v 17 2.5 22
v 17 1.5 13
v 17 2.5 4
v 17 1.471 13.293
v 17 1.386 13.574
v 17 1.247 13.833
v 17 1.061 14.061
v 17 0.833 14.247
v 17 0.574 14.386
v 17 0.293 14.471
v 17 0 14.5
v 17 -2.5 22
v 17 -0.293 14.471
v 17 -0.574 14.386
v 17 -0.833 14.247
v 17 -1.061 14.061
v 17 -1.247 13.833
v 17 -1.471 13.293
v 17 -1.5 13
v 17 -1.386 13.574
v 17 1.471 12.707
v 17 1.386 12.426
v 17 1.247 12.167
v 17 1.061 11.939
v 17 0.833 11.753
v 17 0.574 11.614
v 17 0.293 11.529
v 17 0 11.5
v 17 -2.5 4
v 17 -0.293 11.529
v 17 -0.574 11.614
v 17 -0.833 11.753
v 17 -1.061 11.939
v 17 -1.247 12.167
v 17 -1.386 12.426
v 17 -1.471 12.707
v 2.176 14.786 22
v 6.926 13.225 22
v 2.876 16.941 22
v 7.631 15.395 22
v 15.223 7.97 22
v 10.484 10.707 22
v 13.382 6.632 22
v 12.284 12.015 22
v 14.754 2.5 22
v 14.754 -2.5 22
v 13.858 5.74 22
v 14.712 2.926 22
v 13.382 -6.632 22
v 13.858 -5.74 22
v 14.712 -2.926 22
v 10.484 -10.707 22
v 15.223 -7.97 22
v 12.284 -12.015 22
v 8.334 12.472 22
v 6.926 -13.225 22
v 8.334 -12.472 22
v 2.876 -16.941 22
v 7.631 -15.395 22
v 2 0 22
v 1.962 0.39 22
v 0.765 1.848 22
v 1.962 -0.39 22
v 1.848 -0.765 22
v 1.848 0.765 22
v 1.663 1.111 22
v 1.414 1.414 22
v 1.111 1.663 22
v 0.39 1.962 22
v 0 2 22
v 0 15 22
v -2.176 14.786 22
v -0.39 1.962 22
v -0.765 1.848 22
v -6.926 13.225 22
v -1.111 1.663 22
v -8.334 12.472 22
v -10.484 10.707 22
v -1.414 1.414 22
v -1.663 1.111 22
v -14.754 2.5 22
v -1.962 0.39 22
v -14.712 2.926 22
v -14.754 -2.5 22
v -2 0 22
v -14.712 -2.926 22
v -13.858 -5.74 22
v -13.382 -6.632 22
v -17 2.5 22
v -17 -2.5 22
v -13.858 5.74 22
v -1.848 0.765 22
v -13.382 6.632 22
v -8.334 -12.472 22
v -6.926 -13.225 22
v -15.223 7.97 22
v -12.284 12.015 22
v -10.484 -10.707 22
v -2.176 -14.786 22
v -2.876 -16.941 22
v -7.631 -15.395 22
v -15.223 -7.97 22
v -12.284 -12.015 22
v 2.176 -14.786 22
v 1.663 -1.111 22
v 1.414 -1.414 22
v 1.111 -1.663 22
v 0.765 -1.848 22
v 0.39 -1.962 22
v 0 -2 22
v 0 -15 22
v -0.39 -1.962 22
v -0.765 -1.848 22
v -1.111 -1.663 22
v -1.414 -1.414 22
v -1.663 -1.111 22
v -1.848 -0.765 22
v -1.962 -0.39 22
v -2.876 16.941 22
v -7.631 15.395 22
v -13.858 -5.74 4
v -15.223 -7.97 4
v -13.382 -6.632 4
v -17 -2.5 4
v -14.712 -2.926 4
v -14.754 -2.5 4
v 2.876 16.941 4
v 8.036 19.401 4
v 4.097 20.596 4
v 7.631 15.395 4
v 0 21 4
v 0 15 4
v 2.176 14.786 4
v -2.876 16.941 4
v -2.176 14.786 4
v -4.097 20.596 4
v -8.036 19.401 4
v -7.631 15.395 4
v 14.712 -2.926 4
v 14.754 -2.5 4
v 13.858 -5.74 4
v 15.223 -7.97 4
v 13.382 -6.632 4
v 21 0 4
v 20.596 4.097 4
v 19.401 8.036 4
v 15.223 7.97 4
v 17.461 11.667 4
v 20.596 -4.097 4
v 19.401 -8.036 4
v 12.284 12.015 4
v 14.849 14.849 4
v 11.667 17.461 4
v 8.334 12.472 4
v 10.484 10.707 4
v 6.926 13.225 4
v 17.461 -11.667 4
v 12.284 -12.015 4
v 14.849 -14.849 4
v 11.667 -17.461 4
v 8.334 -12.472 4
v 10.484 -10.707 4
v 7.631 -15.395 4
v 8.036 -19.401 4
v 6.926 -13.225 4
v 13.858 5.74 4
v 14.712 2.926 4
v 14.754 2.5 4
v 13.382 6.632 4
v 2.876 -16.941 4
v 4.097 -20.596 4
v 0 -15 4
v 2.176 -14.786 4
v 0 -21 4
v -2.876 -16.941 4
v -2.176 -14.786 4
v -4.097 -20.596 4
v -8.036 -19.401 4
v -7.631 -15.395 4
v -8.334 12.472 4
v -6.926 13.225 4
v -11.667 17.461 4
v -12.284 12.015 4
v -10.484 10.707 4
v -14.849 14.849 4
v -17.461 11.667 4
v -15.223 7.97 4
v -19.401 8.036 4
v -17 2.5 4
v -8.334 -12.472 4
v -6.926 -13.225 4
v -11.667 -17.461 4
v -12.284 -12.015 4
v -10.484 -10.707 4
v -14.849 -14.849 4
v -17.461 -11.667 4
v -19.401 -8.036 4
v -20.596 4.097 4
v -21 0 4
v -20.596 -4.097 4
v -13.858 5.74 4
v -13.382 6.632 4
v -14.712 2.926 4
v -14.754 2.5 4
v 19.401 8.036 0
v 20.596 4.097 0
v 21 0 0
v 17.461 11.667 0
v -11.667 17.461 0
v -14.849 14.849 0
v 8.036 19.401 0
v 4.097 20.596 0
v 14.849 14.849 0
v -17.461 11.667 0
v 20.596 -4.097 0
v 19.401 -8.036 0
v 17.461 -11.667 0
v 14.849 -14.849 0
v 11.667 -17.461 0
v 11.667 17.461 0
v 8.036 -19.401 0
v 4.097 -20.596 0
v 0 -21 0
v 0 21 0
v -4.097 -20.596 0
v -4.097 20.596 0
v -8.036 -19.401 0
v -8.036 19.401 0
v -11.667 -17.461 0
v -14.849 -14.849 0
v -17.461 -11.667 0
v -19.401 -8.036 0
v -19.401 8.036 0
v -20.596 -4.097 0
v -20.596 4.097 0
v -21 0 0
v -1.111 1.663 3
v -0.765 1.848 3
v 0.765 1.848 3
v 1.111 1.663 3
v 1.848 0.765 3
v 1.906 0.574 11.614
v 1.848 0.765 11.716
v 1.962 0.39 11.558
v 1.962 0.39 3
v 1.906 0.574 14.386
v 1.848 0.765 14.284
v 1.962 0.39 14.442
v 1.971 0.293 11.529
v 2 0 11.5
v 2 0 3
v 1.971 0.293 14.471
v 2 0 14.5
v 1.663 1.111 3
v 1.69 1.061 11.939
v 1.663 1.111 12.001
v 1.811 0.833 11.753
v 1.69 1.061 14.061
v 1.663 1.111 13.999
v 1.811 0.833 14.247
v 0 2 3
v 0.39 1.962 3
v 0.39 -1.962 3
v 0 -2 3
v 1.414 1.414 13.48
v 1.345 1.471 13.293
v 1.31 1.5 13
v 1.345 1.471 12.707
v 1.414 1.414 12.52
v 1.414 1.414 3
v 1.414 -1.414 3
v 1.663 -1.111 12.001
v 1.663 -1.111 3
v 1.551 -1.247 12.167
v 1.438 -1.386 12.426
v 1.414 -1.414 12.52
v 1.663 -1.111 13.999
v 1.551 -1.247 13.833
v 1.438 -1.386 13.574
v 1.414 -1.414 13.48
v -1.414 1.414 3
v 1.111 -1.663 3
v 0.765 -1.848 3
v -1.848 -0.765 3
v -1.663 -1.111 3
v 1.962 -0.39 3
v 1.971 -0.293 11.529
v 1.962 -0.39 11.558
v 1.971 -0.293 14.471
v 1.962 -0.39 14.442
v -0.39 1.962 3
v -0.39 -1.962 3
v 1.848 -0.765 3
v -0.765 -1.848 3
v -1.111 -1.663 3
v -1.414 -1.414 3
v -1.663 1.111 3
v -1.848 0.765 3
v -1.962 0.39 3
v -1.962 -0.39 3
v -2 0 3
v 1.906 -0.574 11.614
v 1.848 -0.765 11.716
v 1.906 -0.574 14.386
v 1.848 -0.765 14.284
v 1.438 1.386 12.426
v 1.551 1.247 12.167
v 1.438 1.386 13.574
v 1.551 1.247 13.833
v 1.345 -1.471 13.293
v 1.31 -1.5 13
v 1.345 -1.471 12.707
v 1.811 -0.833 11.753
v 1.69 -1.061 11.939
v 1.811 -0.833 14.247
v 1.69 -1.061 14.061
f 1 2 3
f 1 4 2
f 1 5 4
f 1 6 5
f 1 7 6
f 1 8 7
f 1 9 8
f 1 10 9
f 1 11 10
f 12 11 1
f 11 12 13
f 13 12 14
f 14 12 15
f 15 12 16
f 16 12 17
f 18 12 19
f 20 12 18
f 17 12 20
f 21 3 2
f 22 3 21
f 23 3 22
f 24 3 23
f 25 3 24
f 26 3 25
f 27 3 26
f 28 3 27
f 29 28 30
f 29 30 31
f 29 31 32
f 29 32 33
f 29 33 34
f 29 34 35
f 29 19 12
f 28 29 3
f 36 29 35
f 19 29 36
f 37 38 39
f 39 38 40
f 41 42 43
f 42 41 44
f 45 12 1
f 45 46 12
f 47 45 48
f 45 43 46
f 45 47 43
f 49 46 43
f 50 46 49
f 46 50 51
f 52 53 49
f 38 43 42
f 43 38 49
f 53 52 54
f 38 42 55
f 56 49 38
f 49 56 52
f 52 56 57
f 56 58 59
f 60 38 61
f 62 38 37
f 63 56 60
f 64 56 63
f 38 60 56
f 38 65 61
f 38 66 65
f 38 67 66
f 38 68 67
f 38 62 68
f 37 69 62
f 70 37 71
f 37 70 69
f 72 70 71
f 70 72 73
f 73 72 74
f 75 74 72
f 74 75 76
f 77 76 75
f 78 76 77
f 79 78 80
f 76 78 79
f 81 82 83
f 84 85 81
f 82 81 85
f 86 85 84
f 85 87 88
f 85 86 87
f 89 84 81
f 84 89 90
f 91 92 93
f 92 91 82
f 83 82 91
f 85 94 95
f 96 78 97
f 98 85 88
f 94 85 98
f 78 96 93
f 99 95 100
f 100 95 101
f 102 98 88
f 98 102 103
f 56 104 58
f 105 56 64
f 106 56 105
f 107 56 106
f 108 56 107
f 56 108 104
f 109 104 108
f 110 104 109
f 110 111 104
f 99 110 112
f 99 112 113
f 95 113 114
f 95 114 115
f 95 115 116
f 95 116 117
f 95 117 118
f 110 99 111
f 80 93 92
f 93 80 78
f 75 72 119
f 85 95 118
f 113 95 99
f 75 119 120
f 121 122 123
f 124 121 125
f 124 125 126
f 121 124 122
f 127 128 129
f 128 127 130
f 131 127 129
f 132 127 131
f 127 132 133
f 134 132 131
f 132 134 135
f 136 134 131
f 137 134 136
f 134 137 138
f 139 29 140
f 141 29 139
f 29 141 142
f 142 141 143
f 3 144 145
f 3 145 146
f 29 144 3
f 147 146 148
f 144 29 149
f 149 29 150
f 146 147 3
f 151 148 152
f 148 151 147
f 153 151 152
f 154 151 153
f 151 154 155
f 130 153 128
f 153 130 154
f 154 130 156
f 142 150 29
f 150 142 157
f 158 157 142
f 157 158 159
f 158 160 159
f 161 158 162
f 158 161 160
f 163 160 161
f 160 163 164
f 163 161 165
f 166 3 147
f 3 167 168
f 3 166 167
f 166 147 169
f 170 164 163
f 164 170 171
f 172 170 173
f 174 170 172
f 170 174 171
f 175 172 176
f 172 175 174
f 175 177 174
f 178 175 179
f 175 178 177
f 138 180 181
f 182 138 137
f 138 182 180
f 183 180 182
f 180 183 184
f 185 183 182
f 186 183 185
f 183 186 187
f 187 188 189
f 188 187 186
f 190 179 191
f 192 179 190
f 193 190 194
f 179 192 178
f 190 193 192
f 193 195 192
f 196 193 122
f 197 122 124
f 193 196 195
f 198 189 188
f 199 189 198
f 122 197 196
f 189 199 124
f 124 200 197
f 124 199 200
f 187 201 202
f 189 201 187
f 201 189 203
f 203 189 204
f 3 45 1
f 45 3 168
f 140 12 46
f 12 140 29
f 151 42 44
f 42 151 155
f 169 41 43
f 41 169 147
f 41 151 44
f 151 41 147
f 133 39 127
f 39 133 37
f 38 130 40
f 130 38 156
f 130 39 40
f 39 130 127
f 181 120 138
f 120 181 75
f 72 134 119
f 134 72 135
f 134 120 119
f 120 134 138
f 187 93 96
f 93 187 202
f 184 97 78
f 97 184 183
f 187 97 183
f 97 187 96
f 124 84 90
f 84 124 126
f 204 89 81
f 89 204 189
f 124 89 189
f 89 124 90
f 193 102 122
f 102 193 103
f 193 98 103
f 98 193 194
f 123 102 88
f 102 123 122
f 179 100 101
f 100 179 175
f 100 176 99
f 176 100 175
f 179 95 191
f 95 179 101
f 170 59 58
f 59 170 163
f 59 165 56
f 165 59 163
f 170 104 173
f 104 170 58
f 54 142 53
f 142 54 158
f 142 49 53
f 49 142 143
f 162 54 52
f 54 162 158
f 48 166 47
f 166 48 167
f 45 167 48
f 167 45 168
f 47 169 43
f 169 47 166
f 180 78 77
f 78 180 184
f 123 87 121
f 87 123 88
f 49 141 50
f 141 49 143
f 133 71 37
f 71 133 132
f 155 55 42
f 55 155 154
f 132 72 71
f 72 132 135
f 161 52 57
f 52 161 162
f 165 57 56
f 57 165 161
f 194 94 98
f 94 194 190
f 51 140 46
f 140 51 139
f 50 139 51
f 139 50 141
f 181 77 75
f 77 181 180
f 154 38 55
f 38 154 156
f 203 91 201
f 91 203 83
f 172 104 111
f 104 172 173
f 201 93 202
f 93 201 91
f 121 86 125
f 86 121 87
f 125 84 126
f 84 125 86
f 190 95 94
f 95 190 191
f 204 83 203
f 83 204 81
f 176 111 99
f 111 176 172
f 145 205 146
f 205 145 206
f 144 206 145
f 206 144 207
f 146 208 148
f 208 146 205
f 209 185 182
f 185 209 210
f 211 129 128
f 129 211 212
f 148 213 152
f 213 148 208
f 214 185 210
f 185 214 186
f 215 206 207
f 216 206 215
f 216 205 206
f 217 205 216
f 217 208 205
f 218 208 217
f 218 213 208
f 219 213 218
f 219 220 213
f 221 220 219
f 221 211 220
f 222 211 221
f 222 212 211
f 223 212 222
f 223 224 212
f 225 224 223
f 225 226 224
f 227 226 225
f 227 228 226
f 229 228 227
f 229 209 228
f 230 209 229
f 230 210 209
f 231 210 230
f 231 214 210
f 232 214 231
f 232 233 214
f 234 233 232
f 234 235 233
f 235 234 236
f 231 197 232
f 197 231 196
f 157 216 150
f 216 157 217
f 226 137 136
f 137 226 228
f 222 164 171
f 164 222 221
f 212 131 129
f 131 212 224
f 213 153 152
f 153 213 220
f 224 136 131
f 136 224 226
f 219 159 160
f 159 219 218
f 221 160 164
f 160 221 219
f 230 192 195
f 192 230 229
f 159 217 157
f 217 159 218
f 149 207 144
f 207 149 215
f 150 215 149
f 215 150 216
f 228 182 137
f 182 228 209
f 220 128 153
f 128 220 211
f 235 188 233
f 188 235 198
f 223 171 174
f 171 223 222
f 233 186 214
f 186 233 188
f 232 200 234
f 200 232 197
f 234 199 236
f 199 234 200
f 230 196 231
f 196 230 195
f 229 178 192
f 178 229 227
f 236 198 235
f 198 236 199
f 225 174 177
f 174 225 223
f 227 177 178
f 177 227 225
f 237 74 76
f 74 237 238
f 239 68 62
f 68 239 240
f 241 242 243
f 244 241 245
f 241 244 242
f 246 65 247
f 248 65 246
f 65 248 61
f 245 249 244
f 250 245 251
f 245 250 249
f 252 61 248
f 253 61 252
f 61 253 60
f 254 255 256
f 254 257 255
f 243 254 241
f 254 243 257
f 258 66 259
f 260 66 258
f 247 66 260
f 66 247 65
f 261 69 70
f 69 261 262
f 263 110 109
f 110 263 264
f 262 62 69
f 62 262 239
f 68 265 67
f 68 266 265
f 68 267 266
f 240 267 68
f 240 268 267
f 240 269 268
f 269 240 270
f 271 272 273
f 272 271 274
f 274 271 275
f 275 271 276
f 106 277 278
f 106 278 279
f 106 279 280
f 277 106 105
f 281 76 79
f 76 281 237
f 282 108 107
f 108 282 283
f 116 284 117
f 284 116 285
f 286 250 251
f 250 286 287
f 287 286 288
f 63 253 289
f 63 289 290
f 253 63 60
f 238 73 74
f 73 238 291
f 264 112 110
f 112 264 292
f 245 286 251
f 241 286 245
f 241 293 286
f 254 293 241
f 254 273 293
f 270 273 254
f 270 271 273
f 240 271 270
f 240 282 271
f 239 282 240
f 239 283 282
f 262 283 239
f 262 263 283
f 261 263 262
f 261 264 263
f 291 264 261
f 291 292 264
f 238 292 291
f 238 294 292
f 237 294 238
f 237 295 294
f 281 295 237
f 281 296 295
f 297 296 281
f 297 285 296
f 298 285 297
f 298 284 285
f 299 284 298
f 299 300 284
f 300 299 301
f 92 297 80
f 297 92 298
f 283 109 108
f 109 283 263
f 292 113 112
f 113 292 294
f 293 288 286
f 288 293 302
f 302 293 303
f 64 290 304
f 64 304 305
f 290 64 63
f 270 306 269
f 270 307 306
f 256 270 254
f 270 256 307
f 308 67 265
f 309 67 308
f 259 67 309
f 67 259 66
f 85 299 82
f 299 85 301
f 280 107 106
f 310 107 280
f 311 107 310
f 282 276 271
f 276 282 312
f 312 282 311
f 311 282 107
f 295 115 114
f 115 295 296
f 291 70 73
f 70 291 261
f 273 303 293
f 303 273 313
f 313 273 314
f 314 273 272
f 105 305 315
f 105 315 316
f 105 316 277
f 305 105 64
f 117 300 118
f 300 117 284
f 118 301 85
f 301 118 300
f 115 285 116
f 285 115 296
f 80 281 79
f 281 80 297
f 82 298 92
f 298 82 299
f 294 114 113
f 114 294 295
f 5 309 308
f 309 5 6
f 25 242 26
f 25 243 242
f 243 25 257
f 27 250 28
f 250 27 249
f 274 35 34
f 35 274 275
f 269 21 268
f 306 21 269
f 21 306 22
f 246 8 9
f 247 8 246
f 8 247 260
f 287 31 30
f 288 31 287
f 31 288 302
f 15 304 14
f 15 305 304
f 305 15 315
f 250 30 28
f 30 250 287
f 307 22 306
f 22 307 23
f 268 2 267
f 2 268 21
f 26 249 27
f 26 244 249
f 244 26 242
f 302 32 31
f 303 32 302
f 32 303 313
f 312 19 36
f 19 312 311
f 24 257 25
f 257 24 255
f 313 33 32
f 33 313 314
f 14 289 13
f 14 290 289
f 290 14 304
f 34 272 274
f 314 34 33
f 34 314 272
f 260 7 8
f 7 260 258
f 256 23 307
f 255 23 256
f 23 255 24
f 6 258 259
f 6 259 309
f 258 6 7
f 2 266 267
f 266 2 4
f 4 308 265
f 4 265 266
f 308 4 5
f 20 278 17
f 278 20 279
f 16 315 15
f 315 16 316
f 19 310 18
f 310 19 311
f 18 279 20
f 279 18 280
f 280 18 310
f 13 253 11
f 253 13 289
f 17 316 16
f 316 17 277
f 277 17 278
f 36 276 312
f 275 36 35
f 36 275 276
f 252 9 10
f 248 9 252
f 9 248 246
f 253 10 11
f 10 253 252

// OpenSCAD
$fn = 32;

// ----------------------------------------------------------------------
// Control knob: skirt knob with grip ribs
// ----------------------------------------------------------------------

// --- parameters (mm) ---
skirt_d = 42;             // skirt diameter
skirt_t = 4;              // skirt thickness
rib_w = 5;                // grip rib width
rib_out = 3;              // grip rib radial protrusion
n_ribs = 10;              // number of grip ribs
knob_d = 30;              // knob body diameter
knob_h = 18;              // knob body height
bore_d = 4;               // shaft bore diameter
set_d = 3;                // set screw bore diameter
fit_tol = 0.05;           // tolerance for press fits, mm
free_tol = 0.2;           // tolerance for clearance fits, mm

rib_step = 360 / n_ribs;  // rib angular step
total_h = skirt_t + knob_h;  // overall height

difference() {
  union() {
    translate([0, 0, skirt_t]) cylinder(h = knob_h, d = knob_d);
    cylinder(h = skirt_t, d = skirt_d);
    for (i = [0 : n_ribs - 1])
      rotate([0, 0, i * rib_step])
        translate([knob_d / 2 - 1, -rib_w / 2, skirt_t])
          cube([rib_out, rib_w, knob_h]);
  }
  translate([0, 0, skirt_t - 1]) cylinder(h = knob_h + 2, d = bore_d);
  translate([-1, 0, skirt_t + knob_h / 2]) rotate([0, 90, 0])
    cylinder(h = knob_d / 2 + bore_d / 2 + 2, d = set_d);
}
